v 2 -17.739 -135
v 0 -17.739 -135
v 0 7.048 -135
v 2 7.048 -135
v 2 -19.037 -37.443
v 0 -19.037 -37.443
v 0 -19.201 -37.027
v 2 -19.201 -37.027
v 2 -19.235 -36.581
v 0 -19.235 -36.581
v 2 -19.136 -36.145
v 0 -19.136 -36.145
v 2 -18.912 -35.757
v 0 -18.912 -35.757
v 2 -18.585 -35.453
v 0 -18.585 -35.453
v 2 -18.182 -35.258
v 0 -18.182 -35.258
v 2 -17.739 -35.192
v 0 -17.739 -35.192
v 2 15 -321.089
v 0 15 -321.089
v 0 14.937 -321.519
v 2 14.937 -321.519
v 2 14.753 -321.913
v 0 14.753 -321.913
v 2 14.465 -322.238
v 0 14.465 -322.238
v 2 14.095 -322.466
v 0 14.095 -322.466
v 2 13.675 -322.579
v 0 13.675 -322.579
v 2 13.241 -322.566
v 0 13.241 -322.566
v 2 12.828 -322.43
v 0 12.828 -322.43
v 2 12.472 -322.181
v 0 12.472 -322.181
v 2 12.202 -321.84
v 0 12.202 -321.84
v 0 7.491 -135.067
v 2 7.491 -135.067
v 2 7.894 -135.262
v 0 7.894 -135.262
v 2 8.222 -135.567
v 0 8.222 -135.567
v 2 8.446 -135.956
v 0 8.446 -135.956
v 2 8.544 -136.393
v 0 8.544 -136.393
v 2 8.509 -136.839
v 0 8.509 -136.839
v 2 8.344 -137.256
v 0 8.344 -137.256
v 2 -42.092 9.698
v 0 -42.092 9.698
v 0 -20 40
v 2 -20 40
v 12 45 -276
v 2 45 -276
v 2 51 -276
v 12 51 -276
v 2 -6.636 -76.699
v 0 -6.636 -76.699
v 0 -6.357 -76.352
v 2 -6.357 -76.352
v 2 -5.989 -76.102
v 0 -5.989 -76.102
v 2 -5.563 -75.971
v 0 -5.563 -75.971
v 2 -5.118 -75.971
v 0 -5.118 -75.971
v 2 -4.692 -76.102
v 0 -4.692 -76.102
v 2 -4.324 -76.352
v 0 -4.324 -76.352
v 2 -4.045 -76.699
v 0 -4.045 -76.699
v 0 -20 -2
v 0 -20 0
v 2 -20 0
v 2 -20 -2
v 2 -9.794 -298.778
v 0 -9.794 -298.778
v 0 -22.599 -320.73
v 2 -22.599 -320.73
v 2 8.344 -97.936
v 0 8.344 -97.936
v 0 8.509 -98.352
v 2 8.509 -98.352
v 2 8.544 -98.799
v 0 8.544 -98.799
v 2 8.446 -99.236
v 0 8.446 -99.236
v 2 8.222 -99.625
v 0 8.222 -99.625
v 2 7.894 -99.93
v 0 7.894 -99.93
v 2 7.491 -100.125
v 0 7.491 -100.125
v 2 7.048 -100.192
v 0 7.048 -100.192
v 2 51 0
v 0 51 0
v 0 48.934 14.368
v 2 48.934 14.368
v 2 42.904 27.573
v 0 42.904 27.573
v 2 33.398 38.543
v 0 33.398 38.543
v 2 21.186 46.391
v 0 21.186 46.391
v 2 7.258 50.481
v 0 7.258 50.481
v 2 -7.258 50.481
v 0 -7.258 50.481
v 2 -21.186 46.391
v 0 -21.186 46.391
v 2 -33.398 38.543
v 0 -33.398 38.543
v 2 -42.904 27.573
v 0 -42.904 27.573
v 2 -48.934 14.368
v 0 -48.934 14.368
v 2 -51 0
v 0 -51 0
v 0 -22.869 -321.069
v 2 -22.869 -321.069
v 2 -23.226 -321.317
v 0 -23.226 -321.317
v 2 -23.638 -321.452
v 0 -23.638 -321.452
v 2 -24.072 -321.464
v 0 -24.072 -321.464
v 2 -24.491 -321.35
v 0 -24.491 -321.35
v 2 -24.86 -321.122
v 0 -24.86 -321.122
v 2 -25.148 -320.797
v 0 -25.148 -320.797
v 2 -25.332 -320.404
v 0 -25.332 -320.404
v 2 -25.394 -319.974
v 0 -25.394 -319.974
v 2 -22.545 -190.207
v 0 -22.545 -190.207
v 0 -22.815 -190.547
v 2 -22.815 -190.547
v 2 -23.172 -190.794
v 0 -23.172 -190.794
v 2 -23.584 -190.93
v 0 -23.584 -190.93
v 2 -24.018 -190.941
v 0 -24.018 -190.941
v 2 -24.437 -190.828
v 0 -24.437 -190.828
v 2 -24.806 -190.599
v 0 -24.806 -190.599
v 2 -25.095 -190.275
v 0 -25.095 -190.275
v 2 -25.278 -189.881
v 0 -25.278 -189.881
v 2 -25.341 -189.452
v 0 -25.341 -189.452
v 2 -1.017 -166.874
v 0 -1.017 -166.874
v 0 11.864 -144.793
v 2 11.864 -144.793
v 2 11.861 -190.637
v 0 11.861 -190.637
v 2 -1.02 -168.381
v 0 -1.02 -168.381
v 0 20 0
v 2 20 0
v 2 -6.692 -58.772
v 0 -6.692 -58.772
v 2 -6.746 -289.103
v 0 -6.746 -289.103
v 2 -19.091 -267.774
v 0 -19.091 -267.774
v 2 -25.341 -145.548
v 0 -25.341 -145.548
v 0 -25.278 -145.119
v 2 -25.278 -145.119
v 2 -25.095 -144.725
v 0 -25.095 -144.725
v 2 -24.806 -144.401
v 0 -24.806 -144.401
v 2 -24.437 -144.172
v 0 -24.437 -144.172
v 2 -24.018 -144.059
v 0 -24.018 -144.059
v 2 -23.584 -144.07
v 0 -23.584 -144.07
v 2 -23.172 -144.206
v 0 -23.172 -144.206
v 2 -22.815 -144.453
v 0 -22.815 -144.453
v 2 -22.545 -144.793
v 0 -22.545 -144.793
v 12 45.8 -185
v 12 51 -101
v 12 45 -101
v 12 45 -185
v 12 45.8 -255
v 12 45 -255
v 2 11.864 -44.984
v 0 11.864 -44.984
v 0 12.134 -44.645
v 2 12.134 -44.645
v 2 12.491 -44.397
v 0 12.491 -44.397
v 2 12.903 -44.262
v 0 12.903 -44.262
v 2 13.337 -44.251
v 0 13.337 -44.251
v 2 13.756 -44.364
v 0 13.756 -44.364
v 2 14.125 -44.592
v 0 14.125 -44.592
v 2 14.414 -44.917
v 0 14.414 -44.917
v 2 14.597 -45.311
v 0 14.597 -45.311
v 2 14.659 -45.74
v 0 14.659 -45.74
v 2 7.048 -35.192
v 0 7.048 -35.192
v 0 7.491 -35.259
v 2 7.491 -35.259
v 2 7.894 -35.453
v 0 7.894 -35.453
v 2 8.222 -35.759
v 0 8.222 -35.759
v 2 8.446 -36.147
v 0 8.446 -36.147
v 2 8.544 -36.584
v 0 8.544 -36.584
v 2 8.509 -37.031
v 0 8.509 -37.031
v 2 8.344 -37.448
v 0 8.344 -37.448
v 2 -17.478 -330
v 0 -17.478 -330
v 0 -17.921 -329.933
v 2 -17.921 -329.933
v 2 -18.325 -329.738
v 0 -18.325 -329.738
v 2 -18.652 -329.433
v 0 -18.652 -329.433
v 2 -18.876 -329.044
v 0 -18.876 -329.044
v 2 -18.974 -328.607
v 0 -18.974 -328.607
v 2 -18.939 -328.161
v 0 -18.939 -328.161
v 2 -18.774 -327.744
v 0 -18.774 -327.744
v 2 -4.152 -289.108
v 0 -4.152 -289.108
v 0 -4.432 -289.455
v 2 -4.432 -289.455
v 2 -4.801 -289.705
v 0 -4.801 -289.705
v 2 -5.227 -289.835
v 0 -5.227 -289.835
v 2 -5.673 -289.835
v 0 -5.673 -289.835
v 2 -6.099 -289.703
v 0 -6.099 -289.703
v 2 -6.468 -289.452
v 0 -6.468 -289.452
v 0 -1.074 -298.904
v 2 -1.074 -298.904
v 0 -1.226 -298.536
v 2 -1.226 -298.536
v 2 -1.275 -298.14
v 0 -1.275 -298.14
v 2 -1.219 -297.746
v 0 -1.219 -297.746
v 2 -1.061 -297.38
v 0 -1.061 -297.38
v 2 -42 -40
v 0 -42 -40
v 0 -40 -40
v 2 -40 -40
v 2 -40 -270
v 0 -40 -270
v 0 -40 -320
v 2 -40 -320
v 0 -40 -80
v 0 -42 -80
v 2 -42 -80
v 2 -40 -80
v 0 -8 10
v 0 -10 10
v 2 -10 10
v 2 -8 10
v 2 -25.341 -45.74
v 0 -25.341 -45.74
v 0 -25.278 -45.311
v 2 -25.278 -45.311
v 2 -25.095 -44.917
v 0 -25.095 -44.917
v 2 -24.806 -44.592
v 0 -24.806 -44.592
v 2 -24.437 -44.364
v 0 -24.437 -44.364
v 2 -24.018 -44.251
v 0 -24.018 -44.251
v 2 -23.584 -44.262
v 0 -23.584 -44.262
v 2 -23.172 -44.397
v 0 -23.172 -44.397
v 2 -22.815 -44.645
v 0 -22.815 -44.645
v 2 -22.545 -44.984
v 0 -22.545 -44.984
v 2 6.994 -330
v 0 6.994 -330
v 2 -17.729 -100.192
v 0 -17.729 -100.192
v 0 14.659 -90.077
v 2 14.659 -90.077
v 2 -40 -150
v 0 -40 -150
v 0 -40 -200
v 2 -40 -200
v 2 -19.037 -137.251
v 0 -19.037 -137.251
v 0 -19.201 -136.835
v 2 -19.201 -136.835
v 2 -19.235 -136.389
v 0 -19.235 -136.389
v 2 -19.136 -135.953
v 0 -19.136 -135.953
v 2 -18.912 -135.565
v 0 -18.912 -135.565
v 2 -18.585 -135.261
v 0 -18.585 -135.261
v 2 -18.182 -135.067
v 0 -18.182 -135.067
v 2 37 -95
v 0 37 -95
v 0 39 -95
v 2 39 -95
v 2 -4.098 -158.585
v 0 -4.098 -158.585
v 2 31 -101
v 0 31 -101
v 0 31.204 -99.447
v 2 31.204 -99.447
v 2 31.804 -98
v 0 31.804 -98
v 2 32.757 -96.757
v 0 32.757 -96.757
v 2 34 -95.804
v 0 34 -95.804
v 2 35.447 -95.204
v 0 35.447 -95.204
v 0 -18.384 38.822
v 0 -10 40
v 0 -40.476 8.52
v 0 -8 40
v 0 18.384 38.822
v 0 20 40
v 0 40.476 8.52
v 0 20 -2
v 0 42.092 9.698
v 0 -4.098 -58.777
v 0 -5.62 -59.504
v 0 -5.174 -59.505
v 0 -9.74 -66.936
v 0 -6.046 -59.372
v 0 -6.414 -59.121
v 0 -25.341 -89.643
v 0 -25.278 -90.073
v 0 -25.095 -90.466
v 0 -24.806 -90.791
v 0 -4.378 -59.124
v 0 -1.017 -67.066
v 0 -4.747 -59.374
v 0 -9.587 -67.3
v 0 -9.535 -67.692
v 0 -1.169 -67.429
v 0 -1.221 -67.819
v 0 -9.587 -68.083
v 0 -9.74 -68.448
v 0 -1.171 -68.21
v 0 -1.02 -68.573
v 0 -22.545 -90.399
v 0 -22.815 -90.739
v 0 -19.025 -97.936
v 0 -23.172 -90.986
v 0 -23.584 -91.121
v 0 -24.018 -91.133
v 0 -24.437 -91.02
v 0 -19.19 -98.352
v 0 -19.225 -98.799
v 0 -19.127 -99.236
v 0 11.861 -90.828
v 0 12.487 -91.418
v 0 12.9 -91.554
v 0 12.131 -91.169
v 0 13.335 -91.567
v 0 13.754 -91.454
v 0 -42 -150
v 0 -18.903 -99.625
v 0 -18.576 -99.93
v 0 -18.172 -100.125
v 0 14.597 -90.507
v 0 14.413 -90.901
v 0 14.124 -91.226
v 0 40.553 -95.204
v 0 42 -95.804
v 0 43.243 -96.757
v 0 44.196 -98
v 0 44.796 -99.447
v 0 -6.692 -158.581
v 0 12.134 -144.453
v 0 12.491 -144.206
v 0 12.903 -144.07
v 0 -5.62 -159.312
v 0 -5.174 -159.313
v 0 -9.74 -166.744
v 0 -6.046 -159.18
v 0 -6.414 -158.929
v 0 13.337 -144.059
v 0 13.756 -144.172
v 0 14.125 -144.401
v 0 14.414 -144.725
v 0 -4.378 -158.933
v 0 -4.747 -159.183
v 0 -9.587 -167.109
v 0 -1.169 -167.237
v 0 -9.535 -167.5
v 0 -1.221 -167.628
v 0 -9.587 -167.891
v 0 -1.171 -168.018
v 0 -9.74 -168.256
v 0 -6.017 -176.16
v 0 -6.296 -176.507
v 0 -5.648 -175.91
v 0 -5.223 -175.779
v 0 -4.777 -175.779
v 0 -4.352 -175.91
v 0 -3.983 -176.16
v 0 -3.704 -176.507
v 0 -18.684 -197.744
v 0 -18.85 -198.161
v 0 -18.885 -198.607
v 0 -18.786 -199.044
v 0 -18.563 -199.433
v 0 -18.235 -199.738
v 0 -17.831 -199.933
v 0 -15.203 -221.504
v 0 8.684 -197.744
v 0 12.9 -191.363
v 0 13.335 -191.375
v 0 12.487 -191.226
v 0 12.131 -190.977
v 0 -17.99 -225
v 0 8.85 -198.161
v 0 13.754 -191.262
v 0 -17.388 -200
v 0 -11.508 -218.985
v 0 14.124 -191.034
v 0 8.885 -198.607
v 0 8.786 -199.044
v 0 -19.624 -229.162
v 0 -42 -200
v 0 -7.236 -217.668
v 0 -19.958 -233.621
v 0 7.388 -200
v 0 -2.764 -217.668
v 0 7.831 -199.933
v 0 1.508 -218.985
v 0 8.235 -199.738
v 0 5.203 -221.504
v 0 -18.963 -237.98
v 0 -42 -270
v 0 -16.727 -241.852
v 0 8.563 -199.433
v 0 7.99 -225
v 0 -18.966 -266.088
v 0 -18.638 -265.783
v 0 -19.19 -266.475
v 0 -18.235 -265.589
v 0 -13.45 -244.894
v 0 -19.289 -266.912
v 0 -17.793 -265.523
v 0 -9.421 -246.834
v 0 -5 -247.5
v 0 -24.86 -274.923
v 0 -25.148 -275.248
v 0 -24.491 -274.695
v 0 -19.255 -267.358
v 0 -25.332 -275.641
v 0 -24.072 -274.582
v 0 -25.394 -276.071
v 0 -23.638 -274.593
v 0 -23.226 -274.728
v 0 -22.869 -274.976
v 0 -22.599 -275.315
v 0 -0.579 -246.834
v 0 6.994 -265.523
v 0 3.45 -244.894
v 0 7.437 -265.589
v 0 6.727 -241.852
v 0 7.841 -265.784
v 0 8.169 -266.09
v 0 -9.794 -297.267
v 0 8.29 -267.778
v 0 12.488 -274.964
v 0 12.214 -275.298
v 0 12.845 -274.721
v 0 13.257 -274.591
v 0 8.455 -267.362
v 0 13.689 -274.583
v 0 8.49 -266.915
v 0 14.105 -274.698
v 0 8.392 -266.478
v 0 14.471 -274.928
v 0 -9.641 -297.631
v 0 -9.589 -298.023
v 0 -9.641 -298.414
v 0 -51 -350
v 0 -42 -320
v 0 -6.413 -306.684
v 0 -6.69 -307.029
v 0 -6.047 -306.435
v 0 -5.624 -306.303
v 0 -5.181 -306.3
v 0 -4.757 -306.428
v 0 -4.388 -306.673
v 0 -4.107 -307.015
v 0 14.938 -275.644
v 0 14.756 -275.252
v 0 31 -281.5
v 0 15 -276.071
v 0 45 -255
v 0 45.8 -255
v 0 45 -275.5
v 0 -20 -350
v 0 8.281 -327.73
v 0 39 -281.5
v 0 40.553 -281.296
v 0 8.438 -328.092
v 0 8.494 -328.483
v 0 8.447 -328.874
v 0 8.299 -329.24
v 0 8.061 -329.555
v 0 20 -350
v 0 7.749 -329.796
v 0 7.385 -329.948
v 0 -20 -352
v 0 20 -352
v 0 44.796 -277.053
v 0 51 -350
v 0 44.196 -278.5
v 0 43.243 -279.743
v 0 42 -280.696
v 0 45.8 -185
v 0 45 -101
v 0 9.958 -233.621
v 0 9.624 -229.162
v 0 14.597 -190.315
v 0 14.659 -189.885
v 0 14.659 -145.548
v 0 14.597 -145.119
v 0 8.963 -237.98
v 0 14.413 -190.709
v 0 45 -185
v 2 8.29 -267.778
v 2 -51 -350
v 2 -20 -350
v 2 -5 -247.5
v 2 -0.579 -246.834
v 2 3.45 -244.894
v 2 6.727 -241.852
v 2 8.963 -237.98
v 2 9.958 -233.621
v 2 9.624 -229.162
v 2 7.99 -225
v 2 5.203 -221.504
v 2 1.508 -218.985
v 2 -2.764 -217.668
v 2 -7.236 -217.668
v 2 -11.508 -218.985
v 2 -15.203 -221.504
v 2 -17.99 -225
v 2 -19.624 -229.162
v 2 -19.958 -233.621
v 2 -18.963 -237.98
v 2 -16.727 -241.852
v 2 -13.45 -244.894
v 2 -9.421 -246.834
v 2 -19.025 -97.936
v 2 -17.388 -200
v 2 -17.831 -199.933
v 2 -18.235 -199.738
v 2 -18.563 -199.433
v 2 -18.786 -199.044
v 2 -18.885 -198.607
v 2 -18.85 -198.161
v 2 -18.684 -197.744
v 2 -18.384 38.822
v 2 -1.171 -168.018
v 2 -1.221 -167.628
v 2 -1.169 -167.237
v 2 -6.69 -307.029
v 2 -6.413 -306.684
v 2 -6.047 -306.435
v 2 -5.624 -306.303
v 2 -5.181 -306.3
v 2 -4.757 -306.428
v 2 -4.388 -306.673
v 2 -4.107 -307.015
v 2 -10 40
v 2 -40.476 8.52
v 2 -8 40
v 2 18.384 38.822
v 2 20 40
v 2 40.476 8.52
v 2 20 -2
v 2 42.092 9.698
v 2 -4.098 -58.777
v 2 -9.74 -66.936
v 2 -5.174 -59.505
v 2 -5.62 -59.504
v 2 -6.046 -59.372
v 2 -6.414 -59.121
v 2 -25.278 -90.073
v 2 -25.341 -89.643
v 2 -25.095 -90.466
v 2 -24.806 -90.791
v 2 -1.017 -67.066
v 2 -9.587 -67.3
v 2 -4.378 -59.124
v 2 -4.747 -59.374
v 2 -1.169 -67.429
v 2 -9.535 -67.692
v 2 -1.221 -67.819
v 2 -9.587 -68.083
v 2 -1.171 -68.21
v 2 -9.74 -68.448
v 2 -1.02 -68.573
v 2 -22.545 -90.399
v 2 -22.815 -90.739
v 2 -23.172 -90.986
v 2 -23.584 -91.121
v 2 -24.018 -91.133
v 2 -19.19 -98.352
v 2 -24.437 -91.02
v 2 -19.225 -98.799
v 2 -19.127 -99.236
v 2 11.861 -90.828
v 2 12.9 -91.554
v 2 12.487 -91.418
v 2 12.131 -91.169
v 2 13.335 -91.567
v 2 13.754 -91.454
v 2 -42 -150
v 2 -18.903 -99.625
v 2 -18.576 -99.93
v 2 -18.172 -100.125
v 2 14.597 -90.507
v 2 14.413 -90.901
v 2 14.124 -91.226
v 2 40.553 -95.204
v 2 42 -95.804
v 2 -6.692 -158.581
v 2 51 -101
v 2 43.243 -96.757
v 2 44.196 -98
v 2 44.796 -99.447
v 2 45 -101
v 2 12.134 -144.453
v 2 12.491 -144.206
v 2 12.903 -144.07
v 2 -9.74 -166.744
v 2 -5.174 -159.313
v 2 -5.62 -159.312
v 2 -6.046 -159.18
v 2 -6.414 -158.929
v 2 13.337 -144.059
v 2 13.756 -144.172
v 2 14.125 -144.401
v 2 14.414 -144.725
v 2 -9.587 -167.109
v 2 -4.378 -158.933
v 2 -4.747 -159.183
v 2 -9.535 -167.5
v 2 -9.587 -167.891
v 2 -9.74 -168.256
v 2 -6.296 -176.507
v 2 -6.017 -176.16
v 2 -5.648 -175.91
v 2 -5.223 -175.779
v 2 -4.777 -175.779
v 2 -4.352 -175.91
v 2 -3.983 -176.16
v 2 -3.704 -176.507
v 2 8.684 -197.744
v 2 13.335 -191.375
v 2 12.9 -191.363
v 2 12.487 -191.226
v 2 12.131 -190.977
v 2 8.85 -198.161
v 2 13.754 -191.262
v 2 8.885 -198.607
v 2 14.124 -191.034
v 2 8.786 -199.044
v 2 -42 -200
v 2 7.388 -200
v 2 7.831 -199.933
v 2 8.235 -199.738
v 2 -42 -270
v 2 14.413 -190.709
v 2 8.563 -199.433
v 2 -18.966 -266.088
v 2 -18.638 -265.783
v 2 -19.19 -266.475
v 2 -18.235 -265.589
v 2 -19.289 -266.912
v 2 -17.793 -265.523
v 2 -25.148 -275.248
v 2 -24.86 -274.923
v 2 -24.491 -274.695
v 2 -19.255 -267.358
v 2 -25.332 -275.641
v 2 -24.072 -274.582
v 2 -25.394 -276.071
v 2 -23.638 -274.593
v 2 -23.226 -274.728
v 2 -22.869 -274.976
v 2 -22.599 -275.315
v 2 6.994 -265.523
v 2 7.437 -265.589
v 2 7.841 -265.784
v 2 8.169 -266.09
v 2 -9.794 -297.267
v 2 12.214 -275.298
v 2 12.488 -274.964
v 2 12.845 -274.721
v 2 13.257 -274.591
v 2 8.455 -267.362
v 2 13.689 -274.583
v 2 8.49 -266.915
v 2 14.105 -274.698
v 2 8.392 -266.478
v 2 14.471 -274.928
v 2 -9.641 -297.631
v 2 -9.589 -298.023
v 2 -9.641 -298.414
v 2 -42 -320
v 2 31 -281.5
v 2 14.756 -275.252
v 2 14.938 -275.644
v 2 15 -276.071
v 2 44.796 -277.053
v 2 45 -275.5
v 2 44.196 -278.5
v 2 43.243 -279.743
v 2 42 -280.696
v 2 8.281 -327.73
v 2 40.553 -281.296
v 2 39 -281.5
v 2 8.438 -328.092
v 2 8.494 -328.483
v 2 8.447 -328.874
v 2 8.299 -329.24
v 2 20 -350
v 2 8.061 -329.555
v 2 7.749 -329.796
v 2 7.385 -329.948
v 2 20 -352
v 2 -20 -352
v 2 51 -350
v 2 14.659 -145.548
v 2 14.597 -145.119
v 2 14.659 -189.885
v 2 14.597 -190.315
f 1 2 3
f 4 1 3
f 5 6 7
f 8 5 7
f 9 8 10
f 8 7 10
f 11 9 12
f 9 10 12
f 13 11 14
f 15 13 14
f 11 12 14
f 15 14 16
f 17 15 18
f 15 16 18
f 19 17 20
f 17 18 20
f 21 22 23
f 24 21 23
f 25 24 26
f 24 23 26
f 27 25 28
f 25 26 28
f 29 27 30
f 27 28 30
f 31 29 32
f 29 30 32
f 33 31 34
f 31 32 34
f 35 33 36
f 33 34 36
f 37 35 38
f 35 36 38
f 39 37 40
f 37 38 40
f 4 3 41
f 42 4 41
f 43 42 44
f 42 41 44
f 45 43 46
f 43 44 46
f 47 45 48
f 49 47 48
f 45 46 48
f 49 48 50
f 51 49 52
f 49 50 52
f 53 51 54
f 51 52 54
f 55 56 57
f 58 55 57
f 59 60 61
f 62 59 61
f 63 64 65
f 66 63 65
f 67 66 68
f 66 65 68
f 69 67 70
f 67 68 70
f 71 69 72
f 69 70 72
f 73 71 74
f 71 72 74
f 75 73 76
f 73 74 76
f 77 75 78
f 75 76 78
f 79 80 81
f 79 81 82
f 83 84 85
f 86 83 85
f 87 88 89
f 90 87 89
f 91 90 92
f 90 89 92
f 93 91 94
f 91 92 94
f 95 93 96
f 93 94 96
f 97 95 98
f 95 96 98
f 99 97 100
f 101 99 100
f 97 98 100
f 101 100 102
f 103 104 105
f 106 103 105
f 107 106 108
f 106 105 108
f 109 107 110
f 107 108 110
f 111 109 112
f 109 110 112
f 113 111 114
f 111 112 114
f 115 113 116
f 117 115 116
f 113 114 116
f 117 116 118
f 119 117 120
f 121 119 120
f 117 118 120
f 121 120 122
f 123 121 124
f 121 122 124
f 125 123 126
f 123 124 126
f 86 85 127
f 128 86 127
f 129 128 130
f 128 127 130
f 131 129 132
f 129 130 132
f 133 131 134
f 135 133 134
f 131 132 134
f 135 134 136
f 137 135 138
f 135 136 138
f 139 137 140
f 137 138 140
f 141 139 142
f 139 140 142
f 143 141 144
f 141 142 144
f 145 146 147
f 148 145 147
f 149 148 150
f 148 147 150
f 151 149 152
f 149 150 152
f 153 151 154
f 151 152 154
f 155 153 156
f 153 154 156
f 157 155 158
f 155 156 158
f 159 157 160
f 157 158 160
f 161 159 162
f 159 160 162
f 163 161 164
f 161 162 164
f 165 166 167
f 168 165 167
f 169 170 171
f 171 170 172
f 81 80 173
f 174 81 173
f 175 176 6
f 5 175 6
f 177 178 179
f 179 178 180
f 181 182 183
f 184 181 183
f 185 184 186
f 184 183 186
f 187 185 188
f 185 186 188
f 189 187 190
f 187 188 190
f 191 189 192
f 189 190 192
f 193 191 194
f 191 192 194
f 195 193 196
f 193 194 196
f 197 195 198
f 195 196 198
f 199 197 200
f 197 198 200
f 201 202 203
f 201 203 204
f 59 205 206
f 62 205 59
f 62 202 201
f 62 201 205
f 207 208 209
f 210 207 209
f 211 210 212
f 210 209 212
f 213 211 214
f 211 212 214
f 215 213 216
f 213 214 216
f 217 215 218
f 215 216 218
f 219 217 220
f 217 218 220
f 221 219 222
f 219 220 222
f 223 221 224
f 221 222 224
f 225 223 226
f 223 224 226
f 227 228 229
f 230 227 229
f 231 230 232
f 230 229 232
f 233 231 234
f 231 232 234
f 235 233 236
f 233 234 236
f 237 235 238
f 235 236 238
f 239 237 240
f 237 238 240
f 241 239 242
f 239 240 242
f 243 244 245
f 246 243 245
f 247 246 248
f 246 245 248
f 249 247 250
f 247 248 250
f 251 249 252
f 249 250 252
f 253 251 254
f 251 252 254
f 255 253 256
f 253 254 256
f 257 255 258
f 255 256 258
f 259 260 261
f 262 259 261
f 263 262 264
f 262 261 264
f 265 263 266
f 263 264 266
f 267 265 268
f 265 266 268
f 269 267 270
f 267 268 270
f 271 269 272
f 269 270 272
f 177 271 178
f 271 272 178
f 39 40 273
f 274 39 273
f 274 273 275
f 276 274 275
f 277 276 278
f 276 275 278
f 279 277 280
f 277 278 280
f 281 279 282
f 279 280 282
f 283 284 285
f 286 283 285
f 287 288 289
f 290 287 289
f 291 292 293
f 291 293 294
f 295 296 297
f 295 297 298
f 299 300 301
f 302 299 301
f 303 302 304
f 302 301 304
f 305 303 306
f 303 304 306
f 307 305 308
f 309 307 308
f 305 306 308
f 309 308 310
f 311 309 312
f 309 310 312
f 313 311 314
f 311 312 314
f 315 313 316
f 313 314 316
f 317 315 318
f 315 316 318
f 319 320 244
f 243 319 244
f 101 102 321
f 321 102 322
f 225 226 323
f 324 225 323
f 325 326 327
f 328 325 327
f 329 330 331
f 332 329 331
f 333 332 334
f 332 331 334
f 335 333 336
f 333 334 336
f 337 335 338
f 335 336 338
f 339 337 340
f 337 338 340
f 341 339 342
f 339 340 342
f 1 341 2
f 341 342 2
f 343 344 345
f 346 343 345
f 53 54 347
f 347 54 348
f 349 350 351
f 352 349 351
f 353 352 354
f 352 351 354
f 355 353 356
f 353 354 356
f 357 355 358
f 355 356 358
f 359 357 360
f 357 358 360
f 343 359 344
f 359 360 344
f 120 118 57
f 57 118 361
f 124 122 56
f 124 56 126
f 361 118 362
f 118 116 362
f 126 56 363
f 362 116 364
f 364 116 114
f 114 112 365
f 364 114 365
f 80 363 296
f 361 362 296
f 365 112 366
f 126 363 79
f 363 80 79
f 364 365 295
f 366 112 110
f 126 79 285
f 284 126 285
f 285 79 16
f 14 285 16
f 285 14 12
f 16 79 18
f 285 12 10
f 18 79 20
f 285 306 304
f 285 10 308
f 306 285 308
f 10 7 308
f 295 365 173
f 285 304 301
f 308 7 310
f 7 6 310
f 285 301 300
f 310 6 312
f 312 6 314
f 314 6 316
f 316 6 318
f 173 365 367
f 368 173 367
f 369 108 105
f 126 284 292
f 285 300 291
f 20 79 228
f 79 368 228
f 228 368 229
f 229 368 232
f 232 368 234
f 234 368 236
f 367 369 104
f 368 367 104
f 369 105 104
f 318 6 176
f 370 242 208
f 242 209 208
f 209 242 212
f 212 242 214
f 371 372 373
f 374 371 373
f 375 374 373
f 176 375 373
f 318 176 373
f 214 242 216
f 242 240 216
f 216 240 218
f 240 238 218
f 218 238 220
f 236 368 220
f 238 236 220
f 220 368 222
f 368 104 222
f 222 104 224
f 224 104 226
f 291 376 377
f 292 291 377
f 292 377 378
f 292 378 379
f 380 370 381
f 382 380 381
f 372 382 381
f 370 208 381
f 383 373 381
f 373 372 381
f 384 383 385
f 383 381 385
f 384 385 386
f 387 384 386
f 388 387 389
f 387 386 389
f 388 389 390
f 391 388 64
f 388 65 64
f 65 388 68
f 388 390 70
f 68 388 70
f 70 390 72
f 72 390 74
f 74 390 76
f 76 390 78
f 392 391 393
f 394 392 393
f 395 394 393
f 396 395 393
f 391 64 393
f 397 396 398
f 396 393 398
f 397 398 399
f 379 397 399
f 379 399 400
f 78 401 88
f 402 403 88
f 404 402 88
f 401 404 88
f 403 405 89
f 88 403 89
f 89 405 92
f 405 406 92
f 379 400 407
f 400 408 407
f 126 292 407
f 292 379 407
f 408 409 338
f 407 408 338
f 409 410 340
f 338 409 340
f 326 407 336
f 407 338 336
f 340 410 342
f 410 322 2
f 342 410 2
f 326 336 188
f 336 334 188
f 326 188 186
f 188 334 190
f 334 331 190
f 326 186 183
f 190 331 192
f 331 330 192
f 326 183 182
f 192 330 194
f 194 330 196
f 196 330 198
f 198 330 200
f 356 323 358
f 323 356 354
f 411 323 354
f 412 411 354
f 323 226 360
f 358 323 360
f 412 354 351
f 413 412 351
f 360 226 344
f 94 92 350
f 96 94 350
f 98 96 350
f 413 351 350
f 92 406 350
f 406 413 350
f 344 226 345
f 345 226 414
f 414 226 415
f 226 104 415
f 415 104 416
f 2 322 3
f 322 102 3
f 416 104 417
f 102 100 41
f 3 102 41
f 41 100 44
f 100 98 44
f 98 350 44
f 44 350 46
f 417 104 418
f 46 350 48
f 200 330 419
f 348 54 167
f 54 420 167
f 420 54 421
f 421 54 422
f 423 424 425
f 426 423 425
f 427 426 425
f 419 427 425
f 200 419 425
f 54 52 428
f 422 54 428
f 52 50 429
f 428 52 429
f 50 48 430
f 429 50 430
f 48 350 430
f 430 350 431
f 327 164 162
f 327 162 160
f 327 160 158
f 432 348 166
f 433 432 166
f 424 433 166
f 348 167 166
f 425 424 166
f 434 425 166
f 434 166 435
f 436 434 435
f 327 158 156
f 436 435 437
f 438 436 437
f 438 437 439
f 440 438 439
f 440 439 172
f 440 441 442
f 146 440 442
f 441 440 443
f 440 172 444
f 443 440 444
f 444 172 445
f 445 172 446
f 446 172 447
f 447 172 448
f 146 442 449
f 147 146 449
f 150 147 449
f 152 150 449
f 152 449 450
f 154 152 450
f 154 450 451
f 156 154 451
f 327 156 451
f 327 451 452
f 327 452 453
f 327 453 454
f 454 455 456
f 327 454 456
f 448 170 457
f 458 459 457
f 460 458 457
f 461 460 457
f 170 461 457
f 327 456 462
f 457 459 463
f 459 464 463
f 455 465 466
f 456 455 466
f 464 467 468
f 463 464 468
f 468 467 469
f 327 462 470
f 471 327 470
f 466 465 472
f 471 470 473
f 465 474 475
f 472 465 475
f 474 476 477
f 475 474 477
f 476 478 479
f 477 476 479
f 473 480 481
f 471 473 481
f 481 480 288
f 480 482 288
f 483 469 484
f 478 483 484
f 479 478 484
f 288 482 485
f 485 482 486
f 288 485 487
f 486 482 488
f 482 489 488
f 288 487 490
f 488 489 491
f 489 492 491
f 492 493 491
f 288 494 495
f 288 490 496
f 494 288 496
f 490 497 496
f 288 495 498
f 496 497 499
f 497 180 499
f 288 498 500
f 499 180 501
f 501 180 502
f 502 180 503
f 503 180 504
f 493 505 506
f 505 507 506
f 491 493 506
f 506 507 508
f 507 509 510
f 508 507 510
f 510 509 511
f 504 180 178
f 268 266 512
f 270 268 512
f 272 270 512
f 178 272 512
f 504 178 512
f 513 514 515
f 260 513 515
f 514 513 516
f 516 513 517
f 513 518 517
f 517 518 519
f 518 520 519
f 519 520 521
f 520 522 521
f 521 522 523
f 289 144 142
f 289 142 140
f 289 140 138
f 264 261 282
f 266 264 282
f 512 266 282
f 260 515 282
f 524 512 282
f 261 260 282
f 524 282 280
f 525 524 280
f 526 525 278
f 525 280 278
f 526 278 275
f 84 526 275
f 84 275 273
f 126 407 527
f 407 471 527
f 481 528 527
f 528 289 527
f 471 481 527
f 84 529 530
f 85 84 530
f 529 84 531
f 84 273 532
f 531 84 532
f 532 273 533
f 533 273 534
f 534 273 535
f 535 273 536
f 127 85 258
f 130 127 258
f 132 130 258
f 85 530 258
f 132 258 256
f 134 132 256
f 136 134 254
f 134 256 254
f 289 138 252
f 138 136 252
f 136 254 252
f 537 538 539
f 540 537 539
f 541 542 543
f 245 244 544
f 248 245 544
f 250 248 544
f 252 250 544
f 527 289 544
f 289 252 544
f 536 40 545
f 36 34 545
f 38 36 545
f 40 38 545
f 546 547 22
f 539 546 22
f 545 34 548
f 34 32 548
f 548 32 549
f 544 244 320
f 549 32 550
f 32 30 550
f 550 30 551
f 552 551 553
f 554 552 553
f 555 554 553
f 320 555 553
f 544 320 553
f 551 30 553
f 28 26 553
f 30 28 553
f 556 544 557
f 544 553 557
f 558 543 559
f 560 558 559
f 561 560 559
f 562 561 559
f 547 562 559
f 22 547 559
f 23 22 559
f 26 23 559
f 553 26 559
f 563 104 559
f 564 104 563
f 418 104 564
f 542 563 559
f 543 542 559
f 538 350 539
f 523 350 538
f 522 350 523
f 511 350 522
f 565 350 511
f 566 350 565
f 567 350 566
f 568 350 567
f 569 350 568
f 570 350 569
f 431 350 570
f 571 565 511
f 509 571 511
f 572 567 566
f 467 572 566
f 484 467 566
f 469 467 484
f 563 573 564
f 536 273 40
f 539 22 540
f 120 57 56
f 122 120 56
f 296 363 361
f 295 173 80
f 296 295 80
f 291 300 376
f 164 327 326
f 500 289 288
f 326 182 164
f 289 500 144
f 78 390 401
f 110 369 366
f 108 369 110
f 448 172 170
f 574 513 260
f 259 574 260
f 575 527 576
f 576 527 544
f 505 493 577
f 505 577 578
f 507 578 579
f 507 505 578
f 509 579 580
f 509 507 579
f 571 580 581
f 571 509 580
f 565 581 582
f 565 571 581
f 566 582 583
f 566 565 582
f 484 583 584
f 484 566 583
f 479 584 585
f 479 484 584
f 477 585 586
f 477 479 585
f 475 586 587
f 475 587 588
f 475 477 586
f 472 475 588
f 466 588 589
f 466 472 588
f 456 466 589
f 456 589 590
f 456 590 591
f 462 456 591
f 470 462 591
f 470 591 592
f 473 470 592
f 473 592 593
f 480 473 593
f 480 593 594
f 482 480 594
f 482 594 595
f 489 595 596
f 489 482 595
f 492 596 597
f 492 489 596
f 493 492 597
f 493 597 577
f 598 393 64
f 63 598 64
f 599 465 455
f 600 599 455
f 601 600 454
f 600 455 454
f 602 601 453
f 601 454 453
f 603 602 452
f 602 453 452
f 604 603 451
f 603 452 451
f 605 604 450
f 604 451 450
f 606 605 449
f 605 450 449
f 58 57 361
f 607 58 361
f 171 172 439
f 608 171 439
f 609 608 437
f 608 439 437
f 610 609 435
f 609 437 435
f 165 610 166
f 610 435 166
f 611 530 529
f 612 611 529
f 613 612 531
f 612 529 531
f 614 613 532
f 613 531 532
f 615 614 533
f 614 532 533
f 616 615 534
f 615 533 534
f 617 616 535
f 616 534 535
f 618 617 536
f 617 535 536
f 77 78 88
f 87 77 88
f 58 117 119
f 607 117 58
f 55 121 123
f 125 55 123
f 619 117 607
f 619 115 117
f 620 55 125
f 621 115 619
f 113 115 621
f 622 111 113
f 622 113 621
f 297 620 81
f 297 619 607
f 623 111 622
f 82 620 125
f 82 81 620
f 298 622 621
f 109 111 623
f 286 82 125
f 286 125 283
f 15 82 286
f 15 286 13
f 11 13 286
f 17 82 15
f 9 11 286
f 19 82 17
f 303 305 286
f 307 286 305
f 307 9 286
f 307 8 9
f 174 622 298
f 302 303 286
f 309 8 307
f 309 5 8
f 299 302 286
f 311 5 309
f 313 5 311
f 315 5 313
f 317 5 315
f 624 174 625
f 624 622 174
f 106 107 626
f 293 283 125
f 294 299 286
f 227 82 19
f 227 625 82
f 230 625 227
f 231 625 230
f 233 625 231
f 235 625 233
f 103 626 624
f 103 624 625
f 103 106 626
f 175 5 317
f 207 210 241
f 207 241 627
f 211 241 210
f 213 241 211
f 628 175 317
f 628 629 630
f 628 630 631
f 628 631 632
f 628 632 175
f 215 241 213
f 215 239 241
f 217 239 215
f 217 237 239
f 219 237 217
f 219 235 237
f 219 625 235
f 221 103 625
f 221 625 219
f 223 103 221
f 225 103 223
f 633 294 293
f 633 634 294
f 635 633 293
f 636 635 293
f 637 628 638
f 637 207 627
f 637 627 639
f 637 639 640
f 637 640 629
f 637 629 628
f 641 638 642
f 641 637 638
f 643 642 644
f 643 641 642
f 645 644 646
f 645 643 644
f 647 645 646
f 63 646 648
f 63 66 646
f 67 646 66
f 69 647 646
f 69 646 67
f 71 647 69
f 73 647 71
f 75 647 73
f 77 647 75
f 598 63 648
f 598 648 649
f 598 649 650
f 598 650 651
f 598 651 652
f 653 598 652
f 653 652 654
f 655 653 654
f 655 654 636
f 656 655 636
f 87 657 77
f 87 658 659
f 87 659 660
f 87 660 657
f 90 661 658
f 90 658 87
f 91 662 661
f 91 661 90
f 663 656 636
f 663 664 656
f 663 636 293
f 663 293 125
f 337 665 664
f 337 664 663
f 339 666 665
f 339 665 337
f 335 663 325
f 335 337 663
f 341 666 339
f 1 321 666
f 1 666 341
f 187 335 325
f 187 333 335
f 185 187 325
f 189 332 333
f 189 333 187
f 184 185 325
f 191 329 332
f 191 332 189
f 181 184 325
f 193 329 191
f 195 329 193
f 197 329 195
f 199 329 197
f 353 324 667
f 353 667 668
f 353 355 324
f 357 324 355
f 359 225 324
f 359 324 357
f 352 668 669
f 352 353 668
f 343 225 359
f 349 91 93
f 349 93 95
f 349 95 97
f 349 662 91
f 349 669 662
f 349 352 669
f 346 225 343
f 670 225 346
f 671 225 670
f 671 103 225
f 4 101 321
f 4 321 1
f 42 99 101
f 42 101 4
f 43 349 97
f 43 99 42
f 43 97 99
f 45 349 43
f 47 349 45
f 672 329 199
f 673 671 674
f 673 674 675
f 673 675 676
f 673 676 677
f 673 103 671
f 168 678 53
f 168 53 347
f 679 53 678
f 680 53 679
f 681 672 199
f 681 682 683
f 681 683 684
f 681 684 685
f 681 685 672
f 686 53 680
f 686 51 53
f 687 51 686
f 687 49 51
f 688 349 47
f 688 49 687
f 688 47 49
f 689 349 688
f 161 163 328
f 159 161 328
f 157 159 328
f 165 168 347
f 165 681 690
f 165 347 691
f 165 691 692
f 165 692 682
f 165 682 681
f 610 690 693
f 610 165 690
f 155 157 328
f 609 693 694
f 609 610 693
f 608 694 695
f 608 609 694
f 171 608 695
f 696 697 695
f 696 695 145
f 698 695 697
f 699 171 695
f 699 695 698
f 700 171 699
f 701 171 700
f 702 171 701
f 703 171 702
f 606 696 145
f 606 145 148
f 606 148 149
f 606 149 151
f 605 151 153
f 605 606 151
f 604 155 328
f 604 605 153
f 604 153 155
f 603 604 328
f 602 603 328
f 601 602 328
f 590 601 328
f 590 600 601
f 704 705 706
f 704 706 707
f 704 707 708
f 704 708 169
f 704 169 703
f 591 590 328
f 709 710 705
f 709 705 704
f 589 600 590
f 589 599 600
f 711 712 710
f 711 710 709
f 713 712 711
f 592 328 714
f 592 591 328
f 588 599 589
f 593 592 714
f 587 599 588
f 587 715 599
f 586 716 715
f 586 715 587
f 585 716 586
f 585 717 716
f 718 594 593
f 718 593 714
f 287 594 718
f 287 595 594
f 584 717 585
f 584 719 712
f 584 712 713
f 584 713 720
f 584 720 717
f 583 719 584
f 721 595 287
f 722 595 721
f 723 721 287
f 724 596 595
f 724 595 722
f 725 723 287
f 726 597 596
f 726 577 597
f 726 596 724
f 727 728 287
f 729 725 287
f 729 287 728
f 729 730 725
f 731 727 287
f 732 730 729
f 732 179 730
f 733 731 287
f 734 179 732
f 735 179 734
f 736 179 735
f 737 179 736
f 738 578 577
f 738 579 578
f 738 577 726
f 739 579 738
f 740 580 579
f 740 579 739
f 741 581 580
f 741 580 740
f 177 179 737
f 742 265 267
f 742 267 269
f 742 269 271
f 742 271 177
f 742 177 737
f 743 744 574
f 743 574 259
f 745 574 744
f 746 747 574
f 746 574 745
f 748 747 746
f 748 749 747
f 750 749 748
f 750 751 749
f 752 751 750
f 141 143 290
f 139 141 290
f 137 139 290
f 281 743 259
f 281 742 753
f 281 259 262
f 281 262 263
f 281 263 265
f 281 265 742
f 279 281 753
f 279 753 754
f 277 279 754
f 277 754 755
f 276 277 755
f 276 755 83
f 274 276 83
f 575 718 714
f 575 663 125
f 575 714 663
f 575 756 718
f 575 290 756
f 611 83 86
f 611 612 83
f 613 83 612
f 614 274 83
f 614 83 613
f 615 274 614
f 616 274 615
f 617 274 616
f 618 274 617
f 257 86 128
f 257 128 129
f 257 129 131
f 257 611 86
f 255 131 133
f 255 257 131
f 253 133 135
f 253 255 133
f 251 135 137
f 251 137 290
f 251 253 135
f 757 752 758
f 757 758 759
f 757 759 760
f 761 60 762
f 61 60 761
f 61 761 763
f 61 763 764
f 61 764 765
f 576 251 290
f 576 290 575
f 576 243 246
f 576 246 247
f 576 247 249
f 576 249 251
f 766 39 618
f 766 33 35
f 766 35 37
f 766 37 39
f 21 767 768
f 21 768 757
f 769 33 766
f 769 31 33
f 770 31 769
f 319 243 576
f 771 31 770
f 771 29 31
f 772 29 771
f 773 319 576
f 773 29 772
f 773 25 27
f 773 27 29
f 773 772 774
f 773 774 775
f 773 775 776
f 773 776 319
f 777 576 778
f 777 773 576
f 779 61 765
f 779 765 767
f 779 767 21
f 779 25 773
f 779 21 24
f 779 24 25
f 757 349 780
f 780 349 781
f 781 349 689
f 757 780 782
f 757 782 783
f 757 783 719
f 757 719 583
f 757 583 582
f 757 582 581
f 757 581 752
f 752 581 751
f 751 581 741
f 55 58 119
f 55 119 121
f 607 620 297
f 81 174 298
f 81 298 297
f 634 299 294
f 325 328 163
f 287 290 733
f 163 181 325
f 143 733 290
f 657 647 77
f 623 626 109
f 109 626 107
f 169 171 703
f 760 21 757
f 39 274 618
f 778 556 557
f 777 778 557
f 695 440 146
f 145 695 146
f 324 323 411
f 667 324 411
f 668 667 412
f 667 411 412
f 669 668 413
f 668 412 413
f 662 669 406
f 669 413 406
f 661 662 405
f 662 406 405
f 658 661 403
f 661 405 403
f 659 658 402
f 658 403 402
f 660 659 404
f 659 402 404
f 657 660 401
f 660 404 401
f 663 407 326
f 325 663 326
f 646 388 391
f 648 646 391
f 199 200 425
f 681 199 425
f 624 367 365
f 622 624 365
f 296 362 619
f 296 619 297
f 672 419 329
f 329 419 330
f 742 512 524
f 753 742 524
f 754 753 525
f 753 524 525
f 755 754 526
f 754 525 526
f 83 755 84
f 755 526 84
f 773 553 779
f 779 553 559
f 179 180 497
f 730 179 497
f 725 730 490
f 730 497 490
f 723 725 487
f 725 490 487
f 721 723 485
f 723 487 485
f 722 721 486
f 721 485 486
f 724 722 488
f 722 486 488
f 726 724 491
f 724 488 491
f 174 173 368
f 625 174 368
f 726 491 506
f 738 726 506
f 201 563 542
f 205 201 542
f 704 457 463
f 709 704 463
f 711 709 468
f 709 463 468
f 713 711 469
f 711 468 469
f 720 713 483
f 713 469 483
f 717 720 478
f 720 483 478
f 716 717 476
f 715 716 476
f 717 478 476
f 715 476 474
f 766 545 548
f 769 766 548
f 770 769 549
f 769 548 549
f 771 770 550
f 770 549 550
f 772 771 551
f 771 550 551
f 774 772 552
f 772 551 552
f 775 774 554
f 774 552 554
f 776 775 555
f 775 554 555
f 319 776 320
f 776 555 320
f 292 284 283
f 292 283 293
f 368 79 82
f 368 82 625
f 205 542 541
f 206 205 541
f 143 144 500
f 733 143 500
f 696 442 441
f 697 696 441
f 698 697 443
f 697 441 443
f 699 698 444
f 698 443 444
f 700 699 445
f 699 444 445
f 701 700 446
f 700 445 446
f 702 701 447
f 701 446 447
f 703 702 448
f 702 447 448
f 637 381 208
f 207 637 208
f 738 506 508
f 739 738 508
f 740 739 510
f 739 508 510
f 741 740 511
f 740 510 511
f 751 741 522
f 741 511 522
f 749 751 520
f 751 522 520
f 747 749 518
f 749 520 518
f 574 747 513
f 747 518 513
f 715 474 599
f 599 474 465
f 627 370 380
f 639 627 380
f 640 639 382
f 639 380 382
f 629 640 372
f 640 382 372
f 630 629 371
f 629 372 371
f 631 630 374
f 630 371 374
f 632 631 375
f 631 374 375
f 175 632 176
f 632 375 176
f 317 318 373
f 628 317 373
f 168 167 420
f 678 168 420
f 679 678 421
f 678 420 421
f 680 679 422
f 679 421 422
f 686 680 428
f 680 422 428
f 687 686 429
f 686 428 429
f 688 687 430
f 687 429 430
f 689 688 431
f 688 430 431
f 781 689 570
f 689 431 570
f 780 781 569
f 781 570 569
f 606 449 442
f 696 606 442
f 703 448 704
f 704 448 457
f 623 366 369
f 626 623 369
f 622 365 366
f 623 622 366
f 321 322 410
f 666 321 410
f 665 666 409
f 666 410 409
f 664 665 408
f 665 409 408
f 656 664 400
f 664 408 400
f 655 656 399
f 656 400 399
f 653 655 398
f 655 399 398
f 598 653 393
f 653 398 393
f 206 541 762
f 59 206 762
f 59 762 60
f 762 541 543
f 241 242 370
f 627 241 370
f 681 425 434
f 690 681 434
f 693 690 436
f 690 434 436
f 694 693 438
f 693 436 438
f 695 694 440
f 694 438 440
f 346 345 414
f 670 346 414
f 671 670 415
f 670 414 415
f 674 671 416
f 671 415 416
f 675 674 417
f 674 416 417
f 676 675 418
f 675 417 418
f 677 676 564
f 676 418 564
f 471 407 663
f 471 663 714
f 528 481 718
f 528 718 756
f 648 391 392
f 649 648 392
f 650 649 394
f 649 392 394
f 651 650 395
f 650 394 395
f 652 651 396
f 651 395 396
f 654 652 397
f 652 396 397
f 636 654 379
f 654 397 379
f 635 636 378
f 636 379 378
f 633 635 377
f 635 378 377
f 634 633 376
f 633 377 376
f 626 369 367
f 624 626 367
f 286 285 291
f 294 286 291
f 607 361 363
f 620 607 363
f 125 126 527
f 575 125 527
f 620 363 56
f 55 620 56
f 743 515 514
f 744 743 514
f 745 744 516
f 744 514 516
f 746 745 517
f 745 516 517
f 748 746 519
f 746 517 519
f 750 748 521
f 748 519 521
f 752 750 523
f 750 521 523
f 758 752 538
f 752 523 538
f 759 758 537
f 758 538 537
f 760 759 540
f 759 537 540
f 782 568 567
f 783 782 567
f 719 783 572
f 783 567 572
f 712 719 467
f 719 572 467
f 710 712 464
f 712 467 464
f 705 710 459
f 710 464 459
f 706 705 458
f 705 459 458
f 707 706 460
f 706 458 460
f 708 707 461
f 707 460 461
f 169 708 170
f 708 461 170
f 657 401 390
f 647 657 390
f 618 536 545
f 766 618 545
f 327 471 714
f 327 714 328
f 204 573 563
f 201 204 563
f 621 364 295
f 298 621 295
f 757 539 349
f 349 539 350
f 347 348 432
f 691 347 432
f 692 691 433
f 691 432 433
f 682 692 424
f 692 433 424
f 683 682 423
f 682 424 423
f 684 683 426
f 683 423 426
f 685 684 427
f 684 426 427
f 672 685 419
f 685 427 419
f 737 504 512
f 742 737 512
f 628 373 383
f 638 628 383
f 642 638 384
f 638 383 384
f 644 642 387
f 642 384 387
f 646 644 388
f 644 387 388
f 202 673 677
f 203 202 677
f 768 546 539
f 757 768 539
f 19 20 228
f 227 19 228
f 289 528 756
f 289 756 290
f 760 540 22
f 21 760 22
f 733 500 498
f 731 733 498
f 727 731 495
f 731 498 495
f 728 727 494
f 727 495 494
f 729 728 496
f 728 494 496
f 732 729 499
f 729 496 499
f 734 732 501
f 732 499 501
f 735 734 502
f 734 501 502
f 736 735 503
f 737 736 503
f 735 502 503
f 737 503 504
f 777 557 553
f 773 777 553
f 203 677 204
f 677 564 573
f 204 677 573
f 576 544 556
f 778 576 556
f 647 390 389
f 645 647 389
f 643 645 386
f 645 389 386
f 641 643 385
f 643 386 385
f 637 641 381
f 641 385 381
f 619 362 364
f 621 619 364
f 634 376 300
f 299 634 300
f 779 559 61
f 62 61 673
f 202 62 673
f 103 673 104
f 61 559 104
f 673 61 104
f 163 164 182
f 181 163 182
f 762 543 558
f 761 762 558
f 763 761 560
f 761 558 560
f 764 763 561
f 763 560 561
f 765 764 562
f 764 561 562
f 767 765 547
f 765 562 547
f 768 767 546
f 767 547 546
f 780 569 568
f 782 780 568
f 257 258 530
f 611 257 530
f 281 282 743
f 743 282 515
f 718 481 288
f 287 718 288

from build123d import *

# Parameters (mm, degrees)
SKETCH_1_W      = 2
SKETCH_1_H      = 40
SKETCH_1_W_2    = 40
SKETCH_1_H_2    = 2
SKETCH_1_W_3    = 50
SKETCH_1_R      = 15
SKETCH_1_W_4    = 30
EXTRUDE_3_DEPTH = 2
EXTRUDE_4_DEPTH = 12


with BuildPart() as part:
    # 草图1 → 凸台-拉伸3 (new body)
    with BuildSketch(Plane(origin=(0, 0, 0), x_dir=(0, 0, -1), z_dir=(1, 0, 0))):
        with BuildLine():
            ThreePointArc((0, 51), (-51, 0), (0, -51))
            Line((0, -51), (350, -51))
            Line((350, -51), (350, -20))
            Line((350, -20), (352, -20))
            Line((352, -20), (352, 20))
            Line((352, 20), (350, 20))
            Line((350, 20), (350, 51))
            Line((350, 51), (0, 51))
        make_face()
        with Locations((1, 0)):
            Rectangle(SKETCH_1_W, SKETCH_1_H, mode=Mode.SUBTRACT)
        with Locations((60, -41)):
            Rectangle(SKETCH_1_W_2, SKETCH_1_H_2, mode=Mode.SUBTRACT)
        with BuildLine():
            Line((35.191745563, -17.73919947), (35.191745563, 7.047932671))
            ThreePointArc((35.191745563, 7.047932671), (35.944654473, 8.3486459), (37.447552101, 8.343601023))
            Line((37.447552101, 8.343601023), (58.776761956, -4.098438059))
            ThreePointArc((58.776761956, -4.098438059), (59.520953252, -5.396654882), (58.772354967, -6.69233548))
            Line((58.772354967, -6.69233548), (37.443145112, -19.03742854))
            ThreePointArc((37.443145112, -19.03742854), (35.942445664, -19.038641528), (35.191745563, -17.73919947))
        make_face(mode=Mode.SUBTRACT)
        with BuildLine():
            Line((89.643364708, -25.34051183), (45.740126418, -25.34051183))
            ThreePointArc((45.740126418, -25.34051183), (44.292110098, -24.231981799), (44.98431988, -22.544843479))
            Line((44.98431988, -22.544843479), (66.935939025, -9.739732311))
            ThreePointArc((66.935939025, -9.739732311), (67.691745563, -9.535400662), (68.447552101, -9.739732311))
            Line((68.447552101, -9.739732311), (90.399171246, -22.544843479))
            ThreePointArc((90.399171246, -22.544843479), (91.091381028, -24.231981799), (89.643364708, -25.34051183))
        make_face(mode=Mode.SUBTRACT)
        with BuildLine():
            ThreePointArc((97.935939025, 8.343601023), (99.438836653, 8.3486459), (100.191745563, 7.047932671))
            Line((100.191745563, 7.047932671), (100.191745563, -17.728956331))
            ThreePointArc((100.191745563, -17.728956331), (99.438836653, -19.02966956), (97.935939025, -19.024624683))
            Line((97.935939025, -19.024624683), (76.698605594, -6.636180181))
            ThreePointArc((76.698605594, -6.636180181), (75.954412132, -5.34051183), (76.698605594, -4.044843479))
            Line((76.698605594, -4.044843479), (97.935939025, 8.343601023))
        make_face(mode=Mode.SUBTRACT)
        with BuildLine():
            Line((135, -17.73919947), (135, 7.047932671))
            ThreePointArc((135, 7.047932671), (135.75290891, 8.3486459), (137.255806538, 8.343601023))
            Line((137.255806538, 8.343601023), (158.585016393, -4.098438059))
            ThreePointArc((158.585016393, -4.098438059), (159.329207689, -5.396654882), (158.580609404, -6.69233548))
            Line((158.580609404, -6.69233548), (137.25139955, -19.03742854))
            ThreePointArc((137.25139955, -19.03742854), (135.750700102, -19.038641528), (135, -17.73919947))
        make_face(mode=Mode.SUBTRACT)
        with Locations((175, -41)):
            Rectangle(SKETCH_1_W_3, SKETCH_1_H_2, mode=Mode.SUBTRACT)
        with Locations((295, -41)):
            Rectangle(SKETCH_1_W_3, SKETCH_1_H_2, mode=Mode.SUBTRACT)
        with BuildLine():
            Line((189.451619145, -25.34051183), (145.548380855, -25.34051183))
            ThreePointArc((145.548380855, -25.34051183), (144.100364535, -24.231981799), (144.792574317, -22.544843479))
            Line((144.792574317, -22.544843479), (166.744193462, -9.739732311))
            ThreePointArc((166.744193462, -9.739732311), (167.5, -9.535400662), (168.255806538, -9.739732311))
            Line((168.255806538, -9.739732311), (190.207425683, -22.544843479))
            ThreePointArc((190.207425683, -22.544843479), (190.899635465, -24.231981799), (189.451619145, -25.34051183))
        make_face(mode=Mode.SUBTRACT)
        with BuildLine():
            ThreePointArc((197.744193462, 8.684112853), (199.24709109, 8.68915773), (200, 7.388444501))
            Line((200, 7.388444501), (200, -17.388444501))
            ThreePointArc((200, -17.388444501), (199.24709109, -18.68915773), (197.744193462, -18.684112853))
            Line((197.744193462, -18.684112853), (176.506860031, -6.295668351))
            ThreePointArc((176.506860031, -6.295668351), (175.762666569, -5), (176.506860031, -3.704331649))
            Line((176.506860031, -3.704331649), (197.744193462, 8.684112853))
        make_face(mode=Mode.SUBTRACT)
        with Locations((232.5, -5)):
            Circle(SKETCH_1_R, mode=Mode.SUBTRACT)
        with BuildLine():
            Line((319.974166797, -25.394327939), (276.070928507, -25.394327939))
            ThreePointArc((276.070928507, -25.394327939), (274.622912187, -24.285797907), (275.315121969, -22.598659587))
            Line((275.315121969, -22.598659587), (297.266741114, -9.793548419))
            ThreePointArc((297.266741114, -9.793548419), (298.022547652, -9.589216771), (298.778354191, -9.793548419))
            Line((298.778354191, -9.793548419), (320.729973336, -22.598659587))
            ThreePointArc((320.729973336, -22.598659587), (321.422183118, -24.285797907), (319.974166797, -25.394327939))
        make_face(mode=Mode.SUBTRACT)
        with BuildLine():
            Line((265.522547652, -17.793015579), (265.522547652, 6.994116563))
            ThreePointArc((265.522547652, 6.994116563), (266.275456563, 8.294829792), (267.778354191, 8.289784914))
            Line((267.778354191, 8.289784914), (289.107564045, -4.152254168))
            ThreePointArc((289.107564045, -4.152254168), (289.851755342, -5.45047099), (289.103157056, -6.746151588))
            Line((289.103157056, -6.746151588), (267.773947202, -19.091244648))
            ThreePointArc((267.773947202, -19.091244648), (266.273247754, -19.092457637), (265.522547652, -17.793015579))
        make_face(mode=Mode.SUBTRACT)
        with BuildLine():
            ThreePointArc((327.730104505, 8.28146303), (329.239985391, 8.298885363), (330, 6.994116563))
            Line((330, 6.994116563), (330, -17.477952976))
            ThreePointArc((330, -17.477952976), (329.24709109, -18.778666205), (327.744193462, -18.773621327))
            Line((327.744193462, -18.773621327), (307.029407683, -6.68999629))
            ThreePointArc((307.029407683, -6.68999629), (306.285236534, -5.40250951), (307.015318726, -4.106981472))
            Line((307.015318726, -4.106981472), (327.730104505, 8.28146303))
        make_face(mode=Mode.SUBTRACT)
        with BuildLine():
            ThreePointArc((44.98431988, 11.863819819), (44.292110098, 13.550958139), (45.740126418, 14.65948817))
            Line((45.740126418, 14.65948817), (90.076891362, 14.65948817))
            ThreePointArc((90.076891362, 14.65948817), (91.525570692, 13.548497422), (90.828290911, 11.861259101))
            Line((90.828290911, 11.861259101), (68.573204722, -1.019720173))
            ThreePointArc((68.573204722, -1.019720173), (67.819256701, -1.221488939), (67.065998635, -1.017159455))
            Line((67.065998635, -1.017159455), (44.98431988, 11.863819819))
        make_face(mode=Mode.SUBTRACT)
        with BuildLine():
            ThreePointArc((144.792574317, 11.863819819), (144.100364535, 13.550958139), (145.548380855, 14.65948817))
            Line((145.548380855, 14.65948817), (189.885145799, 14.65948817))
            ThreePointArc((189.885145799, 14.65948817), (191.333825129, 13.548497422), (190.636545348, 11.861259101))
            Line((190.636545348, 11.861259101), (168.381459159, -1.019720173))
            ThreePointArc((168.381459159, -1.019720173), (167.627511138, -1.221488939), (166.874253072, -1.017159455))
            Line((166.874253072, -1.017159455), (144.792574317, 11.863819819))
        make_face(mode=Mode.SUBTRACT)
        with BuildLine():
            ThreePointArc((275.298059327, 12.21443661), (274.625531488, 13.901032988), (276.070928507, 15))
            Line((276.070928507, 15), (321.088992758, 15))
            ThreePointArc((321.088992758, 15), (322.537672089, 13.889009252), (321.840392308, 12.20177093))
            Line((321.840392308, 12.20177093), (298.904006812, -1.073536282))
            ThreePointArc((298.904006812, -1.073536282), (298.140143671, -1.275255431), (297.379738082, -1.060870603))
            Line((297.379738082, -1.060870603), (275.298059327, 12.21443661))
        make_face(mode=Mode.SUBTRACT)
        with BuildLine():
            Line((95, 37), (95, 39))
            ThreePointArc((95, 39), (96.757359313, 43.242640687), (101, 45))
            Line((101, 45), (185, 45))
            Line((185, 45), (185, 45.8))
            Line((185, 45.8), (255, 45.8))
            Line((255, 45.8), (255, 45))
            Line((255, 45), (275.5, 45))
            ThreePointArc((275.5, 45), (279.742640687, 43.242640687), (281.5, 39))
            Line((281.5, 39), (281.5, 31))
            Line((281.5, 31), (101, 31))
            ThreePointArc((101, 31), (96.757359313, 32.757359313), (95, 37))
        make_face(mode=Mode.SUBTRACT)
        Polygon((-40, 20), (-9.698170842, 42.091834457), (-8.519939671, 40.475736902), (-38.821768829, 18.383902445), align=None, mode=Mode.SUBTRACT)
        with Locations((-25, -9)):
            Rectangle(SKETCH_1_W_4, SKETCH_1_H_2, mode=Mode.SUBTRACT)
        Polygon((-40, -20), (-38.821768829, -18.383902445), (-8.519939671, -40.475736902), (-9.698170842, -42.091834457), align=None, mode=Mode.SUBTRACT)
    extrude(amount=EXTRUDE_3_DEPTH)

    # 草图2 → 凸台-拉伸4 (add)
    with BuildSketch(Plane(origin=(0, 0, 0), x_dir=(0, 0, -1), z_dir=(1, 0, 0))):
        Polygon((101, 51), (101, 45), (185, 45), (185, 45.8), (255, 45.8), (255, 45), (276, 45), (276, 51), align=None)
    extrude(amount=EXTRUDE_4_DEPTH)


solid = part.part
